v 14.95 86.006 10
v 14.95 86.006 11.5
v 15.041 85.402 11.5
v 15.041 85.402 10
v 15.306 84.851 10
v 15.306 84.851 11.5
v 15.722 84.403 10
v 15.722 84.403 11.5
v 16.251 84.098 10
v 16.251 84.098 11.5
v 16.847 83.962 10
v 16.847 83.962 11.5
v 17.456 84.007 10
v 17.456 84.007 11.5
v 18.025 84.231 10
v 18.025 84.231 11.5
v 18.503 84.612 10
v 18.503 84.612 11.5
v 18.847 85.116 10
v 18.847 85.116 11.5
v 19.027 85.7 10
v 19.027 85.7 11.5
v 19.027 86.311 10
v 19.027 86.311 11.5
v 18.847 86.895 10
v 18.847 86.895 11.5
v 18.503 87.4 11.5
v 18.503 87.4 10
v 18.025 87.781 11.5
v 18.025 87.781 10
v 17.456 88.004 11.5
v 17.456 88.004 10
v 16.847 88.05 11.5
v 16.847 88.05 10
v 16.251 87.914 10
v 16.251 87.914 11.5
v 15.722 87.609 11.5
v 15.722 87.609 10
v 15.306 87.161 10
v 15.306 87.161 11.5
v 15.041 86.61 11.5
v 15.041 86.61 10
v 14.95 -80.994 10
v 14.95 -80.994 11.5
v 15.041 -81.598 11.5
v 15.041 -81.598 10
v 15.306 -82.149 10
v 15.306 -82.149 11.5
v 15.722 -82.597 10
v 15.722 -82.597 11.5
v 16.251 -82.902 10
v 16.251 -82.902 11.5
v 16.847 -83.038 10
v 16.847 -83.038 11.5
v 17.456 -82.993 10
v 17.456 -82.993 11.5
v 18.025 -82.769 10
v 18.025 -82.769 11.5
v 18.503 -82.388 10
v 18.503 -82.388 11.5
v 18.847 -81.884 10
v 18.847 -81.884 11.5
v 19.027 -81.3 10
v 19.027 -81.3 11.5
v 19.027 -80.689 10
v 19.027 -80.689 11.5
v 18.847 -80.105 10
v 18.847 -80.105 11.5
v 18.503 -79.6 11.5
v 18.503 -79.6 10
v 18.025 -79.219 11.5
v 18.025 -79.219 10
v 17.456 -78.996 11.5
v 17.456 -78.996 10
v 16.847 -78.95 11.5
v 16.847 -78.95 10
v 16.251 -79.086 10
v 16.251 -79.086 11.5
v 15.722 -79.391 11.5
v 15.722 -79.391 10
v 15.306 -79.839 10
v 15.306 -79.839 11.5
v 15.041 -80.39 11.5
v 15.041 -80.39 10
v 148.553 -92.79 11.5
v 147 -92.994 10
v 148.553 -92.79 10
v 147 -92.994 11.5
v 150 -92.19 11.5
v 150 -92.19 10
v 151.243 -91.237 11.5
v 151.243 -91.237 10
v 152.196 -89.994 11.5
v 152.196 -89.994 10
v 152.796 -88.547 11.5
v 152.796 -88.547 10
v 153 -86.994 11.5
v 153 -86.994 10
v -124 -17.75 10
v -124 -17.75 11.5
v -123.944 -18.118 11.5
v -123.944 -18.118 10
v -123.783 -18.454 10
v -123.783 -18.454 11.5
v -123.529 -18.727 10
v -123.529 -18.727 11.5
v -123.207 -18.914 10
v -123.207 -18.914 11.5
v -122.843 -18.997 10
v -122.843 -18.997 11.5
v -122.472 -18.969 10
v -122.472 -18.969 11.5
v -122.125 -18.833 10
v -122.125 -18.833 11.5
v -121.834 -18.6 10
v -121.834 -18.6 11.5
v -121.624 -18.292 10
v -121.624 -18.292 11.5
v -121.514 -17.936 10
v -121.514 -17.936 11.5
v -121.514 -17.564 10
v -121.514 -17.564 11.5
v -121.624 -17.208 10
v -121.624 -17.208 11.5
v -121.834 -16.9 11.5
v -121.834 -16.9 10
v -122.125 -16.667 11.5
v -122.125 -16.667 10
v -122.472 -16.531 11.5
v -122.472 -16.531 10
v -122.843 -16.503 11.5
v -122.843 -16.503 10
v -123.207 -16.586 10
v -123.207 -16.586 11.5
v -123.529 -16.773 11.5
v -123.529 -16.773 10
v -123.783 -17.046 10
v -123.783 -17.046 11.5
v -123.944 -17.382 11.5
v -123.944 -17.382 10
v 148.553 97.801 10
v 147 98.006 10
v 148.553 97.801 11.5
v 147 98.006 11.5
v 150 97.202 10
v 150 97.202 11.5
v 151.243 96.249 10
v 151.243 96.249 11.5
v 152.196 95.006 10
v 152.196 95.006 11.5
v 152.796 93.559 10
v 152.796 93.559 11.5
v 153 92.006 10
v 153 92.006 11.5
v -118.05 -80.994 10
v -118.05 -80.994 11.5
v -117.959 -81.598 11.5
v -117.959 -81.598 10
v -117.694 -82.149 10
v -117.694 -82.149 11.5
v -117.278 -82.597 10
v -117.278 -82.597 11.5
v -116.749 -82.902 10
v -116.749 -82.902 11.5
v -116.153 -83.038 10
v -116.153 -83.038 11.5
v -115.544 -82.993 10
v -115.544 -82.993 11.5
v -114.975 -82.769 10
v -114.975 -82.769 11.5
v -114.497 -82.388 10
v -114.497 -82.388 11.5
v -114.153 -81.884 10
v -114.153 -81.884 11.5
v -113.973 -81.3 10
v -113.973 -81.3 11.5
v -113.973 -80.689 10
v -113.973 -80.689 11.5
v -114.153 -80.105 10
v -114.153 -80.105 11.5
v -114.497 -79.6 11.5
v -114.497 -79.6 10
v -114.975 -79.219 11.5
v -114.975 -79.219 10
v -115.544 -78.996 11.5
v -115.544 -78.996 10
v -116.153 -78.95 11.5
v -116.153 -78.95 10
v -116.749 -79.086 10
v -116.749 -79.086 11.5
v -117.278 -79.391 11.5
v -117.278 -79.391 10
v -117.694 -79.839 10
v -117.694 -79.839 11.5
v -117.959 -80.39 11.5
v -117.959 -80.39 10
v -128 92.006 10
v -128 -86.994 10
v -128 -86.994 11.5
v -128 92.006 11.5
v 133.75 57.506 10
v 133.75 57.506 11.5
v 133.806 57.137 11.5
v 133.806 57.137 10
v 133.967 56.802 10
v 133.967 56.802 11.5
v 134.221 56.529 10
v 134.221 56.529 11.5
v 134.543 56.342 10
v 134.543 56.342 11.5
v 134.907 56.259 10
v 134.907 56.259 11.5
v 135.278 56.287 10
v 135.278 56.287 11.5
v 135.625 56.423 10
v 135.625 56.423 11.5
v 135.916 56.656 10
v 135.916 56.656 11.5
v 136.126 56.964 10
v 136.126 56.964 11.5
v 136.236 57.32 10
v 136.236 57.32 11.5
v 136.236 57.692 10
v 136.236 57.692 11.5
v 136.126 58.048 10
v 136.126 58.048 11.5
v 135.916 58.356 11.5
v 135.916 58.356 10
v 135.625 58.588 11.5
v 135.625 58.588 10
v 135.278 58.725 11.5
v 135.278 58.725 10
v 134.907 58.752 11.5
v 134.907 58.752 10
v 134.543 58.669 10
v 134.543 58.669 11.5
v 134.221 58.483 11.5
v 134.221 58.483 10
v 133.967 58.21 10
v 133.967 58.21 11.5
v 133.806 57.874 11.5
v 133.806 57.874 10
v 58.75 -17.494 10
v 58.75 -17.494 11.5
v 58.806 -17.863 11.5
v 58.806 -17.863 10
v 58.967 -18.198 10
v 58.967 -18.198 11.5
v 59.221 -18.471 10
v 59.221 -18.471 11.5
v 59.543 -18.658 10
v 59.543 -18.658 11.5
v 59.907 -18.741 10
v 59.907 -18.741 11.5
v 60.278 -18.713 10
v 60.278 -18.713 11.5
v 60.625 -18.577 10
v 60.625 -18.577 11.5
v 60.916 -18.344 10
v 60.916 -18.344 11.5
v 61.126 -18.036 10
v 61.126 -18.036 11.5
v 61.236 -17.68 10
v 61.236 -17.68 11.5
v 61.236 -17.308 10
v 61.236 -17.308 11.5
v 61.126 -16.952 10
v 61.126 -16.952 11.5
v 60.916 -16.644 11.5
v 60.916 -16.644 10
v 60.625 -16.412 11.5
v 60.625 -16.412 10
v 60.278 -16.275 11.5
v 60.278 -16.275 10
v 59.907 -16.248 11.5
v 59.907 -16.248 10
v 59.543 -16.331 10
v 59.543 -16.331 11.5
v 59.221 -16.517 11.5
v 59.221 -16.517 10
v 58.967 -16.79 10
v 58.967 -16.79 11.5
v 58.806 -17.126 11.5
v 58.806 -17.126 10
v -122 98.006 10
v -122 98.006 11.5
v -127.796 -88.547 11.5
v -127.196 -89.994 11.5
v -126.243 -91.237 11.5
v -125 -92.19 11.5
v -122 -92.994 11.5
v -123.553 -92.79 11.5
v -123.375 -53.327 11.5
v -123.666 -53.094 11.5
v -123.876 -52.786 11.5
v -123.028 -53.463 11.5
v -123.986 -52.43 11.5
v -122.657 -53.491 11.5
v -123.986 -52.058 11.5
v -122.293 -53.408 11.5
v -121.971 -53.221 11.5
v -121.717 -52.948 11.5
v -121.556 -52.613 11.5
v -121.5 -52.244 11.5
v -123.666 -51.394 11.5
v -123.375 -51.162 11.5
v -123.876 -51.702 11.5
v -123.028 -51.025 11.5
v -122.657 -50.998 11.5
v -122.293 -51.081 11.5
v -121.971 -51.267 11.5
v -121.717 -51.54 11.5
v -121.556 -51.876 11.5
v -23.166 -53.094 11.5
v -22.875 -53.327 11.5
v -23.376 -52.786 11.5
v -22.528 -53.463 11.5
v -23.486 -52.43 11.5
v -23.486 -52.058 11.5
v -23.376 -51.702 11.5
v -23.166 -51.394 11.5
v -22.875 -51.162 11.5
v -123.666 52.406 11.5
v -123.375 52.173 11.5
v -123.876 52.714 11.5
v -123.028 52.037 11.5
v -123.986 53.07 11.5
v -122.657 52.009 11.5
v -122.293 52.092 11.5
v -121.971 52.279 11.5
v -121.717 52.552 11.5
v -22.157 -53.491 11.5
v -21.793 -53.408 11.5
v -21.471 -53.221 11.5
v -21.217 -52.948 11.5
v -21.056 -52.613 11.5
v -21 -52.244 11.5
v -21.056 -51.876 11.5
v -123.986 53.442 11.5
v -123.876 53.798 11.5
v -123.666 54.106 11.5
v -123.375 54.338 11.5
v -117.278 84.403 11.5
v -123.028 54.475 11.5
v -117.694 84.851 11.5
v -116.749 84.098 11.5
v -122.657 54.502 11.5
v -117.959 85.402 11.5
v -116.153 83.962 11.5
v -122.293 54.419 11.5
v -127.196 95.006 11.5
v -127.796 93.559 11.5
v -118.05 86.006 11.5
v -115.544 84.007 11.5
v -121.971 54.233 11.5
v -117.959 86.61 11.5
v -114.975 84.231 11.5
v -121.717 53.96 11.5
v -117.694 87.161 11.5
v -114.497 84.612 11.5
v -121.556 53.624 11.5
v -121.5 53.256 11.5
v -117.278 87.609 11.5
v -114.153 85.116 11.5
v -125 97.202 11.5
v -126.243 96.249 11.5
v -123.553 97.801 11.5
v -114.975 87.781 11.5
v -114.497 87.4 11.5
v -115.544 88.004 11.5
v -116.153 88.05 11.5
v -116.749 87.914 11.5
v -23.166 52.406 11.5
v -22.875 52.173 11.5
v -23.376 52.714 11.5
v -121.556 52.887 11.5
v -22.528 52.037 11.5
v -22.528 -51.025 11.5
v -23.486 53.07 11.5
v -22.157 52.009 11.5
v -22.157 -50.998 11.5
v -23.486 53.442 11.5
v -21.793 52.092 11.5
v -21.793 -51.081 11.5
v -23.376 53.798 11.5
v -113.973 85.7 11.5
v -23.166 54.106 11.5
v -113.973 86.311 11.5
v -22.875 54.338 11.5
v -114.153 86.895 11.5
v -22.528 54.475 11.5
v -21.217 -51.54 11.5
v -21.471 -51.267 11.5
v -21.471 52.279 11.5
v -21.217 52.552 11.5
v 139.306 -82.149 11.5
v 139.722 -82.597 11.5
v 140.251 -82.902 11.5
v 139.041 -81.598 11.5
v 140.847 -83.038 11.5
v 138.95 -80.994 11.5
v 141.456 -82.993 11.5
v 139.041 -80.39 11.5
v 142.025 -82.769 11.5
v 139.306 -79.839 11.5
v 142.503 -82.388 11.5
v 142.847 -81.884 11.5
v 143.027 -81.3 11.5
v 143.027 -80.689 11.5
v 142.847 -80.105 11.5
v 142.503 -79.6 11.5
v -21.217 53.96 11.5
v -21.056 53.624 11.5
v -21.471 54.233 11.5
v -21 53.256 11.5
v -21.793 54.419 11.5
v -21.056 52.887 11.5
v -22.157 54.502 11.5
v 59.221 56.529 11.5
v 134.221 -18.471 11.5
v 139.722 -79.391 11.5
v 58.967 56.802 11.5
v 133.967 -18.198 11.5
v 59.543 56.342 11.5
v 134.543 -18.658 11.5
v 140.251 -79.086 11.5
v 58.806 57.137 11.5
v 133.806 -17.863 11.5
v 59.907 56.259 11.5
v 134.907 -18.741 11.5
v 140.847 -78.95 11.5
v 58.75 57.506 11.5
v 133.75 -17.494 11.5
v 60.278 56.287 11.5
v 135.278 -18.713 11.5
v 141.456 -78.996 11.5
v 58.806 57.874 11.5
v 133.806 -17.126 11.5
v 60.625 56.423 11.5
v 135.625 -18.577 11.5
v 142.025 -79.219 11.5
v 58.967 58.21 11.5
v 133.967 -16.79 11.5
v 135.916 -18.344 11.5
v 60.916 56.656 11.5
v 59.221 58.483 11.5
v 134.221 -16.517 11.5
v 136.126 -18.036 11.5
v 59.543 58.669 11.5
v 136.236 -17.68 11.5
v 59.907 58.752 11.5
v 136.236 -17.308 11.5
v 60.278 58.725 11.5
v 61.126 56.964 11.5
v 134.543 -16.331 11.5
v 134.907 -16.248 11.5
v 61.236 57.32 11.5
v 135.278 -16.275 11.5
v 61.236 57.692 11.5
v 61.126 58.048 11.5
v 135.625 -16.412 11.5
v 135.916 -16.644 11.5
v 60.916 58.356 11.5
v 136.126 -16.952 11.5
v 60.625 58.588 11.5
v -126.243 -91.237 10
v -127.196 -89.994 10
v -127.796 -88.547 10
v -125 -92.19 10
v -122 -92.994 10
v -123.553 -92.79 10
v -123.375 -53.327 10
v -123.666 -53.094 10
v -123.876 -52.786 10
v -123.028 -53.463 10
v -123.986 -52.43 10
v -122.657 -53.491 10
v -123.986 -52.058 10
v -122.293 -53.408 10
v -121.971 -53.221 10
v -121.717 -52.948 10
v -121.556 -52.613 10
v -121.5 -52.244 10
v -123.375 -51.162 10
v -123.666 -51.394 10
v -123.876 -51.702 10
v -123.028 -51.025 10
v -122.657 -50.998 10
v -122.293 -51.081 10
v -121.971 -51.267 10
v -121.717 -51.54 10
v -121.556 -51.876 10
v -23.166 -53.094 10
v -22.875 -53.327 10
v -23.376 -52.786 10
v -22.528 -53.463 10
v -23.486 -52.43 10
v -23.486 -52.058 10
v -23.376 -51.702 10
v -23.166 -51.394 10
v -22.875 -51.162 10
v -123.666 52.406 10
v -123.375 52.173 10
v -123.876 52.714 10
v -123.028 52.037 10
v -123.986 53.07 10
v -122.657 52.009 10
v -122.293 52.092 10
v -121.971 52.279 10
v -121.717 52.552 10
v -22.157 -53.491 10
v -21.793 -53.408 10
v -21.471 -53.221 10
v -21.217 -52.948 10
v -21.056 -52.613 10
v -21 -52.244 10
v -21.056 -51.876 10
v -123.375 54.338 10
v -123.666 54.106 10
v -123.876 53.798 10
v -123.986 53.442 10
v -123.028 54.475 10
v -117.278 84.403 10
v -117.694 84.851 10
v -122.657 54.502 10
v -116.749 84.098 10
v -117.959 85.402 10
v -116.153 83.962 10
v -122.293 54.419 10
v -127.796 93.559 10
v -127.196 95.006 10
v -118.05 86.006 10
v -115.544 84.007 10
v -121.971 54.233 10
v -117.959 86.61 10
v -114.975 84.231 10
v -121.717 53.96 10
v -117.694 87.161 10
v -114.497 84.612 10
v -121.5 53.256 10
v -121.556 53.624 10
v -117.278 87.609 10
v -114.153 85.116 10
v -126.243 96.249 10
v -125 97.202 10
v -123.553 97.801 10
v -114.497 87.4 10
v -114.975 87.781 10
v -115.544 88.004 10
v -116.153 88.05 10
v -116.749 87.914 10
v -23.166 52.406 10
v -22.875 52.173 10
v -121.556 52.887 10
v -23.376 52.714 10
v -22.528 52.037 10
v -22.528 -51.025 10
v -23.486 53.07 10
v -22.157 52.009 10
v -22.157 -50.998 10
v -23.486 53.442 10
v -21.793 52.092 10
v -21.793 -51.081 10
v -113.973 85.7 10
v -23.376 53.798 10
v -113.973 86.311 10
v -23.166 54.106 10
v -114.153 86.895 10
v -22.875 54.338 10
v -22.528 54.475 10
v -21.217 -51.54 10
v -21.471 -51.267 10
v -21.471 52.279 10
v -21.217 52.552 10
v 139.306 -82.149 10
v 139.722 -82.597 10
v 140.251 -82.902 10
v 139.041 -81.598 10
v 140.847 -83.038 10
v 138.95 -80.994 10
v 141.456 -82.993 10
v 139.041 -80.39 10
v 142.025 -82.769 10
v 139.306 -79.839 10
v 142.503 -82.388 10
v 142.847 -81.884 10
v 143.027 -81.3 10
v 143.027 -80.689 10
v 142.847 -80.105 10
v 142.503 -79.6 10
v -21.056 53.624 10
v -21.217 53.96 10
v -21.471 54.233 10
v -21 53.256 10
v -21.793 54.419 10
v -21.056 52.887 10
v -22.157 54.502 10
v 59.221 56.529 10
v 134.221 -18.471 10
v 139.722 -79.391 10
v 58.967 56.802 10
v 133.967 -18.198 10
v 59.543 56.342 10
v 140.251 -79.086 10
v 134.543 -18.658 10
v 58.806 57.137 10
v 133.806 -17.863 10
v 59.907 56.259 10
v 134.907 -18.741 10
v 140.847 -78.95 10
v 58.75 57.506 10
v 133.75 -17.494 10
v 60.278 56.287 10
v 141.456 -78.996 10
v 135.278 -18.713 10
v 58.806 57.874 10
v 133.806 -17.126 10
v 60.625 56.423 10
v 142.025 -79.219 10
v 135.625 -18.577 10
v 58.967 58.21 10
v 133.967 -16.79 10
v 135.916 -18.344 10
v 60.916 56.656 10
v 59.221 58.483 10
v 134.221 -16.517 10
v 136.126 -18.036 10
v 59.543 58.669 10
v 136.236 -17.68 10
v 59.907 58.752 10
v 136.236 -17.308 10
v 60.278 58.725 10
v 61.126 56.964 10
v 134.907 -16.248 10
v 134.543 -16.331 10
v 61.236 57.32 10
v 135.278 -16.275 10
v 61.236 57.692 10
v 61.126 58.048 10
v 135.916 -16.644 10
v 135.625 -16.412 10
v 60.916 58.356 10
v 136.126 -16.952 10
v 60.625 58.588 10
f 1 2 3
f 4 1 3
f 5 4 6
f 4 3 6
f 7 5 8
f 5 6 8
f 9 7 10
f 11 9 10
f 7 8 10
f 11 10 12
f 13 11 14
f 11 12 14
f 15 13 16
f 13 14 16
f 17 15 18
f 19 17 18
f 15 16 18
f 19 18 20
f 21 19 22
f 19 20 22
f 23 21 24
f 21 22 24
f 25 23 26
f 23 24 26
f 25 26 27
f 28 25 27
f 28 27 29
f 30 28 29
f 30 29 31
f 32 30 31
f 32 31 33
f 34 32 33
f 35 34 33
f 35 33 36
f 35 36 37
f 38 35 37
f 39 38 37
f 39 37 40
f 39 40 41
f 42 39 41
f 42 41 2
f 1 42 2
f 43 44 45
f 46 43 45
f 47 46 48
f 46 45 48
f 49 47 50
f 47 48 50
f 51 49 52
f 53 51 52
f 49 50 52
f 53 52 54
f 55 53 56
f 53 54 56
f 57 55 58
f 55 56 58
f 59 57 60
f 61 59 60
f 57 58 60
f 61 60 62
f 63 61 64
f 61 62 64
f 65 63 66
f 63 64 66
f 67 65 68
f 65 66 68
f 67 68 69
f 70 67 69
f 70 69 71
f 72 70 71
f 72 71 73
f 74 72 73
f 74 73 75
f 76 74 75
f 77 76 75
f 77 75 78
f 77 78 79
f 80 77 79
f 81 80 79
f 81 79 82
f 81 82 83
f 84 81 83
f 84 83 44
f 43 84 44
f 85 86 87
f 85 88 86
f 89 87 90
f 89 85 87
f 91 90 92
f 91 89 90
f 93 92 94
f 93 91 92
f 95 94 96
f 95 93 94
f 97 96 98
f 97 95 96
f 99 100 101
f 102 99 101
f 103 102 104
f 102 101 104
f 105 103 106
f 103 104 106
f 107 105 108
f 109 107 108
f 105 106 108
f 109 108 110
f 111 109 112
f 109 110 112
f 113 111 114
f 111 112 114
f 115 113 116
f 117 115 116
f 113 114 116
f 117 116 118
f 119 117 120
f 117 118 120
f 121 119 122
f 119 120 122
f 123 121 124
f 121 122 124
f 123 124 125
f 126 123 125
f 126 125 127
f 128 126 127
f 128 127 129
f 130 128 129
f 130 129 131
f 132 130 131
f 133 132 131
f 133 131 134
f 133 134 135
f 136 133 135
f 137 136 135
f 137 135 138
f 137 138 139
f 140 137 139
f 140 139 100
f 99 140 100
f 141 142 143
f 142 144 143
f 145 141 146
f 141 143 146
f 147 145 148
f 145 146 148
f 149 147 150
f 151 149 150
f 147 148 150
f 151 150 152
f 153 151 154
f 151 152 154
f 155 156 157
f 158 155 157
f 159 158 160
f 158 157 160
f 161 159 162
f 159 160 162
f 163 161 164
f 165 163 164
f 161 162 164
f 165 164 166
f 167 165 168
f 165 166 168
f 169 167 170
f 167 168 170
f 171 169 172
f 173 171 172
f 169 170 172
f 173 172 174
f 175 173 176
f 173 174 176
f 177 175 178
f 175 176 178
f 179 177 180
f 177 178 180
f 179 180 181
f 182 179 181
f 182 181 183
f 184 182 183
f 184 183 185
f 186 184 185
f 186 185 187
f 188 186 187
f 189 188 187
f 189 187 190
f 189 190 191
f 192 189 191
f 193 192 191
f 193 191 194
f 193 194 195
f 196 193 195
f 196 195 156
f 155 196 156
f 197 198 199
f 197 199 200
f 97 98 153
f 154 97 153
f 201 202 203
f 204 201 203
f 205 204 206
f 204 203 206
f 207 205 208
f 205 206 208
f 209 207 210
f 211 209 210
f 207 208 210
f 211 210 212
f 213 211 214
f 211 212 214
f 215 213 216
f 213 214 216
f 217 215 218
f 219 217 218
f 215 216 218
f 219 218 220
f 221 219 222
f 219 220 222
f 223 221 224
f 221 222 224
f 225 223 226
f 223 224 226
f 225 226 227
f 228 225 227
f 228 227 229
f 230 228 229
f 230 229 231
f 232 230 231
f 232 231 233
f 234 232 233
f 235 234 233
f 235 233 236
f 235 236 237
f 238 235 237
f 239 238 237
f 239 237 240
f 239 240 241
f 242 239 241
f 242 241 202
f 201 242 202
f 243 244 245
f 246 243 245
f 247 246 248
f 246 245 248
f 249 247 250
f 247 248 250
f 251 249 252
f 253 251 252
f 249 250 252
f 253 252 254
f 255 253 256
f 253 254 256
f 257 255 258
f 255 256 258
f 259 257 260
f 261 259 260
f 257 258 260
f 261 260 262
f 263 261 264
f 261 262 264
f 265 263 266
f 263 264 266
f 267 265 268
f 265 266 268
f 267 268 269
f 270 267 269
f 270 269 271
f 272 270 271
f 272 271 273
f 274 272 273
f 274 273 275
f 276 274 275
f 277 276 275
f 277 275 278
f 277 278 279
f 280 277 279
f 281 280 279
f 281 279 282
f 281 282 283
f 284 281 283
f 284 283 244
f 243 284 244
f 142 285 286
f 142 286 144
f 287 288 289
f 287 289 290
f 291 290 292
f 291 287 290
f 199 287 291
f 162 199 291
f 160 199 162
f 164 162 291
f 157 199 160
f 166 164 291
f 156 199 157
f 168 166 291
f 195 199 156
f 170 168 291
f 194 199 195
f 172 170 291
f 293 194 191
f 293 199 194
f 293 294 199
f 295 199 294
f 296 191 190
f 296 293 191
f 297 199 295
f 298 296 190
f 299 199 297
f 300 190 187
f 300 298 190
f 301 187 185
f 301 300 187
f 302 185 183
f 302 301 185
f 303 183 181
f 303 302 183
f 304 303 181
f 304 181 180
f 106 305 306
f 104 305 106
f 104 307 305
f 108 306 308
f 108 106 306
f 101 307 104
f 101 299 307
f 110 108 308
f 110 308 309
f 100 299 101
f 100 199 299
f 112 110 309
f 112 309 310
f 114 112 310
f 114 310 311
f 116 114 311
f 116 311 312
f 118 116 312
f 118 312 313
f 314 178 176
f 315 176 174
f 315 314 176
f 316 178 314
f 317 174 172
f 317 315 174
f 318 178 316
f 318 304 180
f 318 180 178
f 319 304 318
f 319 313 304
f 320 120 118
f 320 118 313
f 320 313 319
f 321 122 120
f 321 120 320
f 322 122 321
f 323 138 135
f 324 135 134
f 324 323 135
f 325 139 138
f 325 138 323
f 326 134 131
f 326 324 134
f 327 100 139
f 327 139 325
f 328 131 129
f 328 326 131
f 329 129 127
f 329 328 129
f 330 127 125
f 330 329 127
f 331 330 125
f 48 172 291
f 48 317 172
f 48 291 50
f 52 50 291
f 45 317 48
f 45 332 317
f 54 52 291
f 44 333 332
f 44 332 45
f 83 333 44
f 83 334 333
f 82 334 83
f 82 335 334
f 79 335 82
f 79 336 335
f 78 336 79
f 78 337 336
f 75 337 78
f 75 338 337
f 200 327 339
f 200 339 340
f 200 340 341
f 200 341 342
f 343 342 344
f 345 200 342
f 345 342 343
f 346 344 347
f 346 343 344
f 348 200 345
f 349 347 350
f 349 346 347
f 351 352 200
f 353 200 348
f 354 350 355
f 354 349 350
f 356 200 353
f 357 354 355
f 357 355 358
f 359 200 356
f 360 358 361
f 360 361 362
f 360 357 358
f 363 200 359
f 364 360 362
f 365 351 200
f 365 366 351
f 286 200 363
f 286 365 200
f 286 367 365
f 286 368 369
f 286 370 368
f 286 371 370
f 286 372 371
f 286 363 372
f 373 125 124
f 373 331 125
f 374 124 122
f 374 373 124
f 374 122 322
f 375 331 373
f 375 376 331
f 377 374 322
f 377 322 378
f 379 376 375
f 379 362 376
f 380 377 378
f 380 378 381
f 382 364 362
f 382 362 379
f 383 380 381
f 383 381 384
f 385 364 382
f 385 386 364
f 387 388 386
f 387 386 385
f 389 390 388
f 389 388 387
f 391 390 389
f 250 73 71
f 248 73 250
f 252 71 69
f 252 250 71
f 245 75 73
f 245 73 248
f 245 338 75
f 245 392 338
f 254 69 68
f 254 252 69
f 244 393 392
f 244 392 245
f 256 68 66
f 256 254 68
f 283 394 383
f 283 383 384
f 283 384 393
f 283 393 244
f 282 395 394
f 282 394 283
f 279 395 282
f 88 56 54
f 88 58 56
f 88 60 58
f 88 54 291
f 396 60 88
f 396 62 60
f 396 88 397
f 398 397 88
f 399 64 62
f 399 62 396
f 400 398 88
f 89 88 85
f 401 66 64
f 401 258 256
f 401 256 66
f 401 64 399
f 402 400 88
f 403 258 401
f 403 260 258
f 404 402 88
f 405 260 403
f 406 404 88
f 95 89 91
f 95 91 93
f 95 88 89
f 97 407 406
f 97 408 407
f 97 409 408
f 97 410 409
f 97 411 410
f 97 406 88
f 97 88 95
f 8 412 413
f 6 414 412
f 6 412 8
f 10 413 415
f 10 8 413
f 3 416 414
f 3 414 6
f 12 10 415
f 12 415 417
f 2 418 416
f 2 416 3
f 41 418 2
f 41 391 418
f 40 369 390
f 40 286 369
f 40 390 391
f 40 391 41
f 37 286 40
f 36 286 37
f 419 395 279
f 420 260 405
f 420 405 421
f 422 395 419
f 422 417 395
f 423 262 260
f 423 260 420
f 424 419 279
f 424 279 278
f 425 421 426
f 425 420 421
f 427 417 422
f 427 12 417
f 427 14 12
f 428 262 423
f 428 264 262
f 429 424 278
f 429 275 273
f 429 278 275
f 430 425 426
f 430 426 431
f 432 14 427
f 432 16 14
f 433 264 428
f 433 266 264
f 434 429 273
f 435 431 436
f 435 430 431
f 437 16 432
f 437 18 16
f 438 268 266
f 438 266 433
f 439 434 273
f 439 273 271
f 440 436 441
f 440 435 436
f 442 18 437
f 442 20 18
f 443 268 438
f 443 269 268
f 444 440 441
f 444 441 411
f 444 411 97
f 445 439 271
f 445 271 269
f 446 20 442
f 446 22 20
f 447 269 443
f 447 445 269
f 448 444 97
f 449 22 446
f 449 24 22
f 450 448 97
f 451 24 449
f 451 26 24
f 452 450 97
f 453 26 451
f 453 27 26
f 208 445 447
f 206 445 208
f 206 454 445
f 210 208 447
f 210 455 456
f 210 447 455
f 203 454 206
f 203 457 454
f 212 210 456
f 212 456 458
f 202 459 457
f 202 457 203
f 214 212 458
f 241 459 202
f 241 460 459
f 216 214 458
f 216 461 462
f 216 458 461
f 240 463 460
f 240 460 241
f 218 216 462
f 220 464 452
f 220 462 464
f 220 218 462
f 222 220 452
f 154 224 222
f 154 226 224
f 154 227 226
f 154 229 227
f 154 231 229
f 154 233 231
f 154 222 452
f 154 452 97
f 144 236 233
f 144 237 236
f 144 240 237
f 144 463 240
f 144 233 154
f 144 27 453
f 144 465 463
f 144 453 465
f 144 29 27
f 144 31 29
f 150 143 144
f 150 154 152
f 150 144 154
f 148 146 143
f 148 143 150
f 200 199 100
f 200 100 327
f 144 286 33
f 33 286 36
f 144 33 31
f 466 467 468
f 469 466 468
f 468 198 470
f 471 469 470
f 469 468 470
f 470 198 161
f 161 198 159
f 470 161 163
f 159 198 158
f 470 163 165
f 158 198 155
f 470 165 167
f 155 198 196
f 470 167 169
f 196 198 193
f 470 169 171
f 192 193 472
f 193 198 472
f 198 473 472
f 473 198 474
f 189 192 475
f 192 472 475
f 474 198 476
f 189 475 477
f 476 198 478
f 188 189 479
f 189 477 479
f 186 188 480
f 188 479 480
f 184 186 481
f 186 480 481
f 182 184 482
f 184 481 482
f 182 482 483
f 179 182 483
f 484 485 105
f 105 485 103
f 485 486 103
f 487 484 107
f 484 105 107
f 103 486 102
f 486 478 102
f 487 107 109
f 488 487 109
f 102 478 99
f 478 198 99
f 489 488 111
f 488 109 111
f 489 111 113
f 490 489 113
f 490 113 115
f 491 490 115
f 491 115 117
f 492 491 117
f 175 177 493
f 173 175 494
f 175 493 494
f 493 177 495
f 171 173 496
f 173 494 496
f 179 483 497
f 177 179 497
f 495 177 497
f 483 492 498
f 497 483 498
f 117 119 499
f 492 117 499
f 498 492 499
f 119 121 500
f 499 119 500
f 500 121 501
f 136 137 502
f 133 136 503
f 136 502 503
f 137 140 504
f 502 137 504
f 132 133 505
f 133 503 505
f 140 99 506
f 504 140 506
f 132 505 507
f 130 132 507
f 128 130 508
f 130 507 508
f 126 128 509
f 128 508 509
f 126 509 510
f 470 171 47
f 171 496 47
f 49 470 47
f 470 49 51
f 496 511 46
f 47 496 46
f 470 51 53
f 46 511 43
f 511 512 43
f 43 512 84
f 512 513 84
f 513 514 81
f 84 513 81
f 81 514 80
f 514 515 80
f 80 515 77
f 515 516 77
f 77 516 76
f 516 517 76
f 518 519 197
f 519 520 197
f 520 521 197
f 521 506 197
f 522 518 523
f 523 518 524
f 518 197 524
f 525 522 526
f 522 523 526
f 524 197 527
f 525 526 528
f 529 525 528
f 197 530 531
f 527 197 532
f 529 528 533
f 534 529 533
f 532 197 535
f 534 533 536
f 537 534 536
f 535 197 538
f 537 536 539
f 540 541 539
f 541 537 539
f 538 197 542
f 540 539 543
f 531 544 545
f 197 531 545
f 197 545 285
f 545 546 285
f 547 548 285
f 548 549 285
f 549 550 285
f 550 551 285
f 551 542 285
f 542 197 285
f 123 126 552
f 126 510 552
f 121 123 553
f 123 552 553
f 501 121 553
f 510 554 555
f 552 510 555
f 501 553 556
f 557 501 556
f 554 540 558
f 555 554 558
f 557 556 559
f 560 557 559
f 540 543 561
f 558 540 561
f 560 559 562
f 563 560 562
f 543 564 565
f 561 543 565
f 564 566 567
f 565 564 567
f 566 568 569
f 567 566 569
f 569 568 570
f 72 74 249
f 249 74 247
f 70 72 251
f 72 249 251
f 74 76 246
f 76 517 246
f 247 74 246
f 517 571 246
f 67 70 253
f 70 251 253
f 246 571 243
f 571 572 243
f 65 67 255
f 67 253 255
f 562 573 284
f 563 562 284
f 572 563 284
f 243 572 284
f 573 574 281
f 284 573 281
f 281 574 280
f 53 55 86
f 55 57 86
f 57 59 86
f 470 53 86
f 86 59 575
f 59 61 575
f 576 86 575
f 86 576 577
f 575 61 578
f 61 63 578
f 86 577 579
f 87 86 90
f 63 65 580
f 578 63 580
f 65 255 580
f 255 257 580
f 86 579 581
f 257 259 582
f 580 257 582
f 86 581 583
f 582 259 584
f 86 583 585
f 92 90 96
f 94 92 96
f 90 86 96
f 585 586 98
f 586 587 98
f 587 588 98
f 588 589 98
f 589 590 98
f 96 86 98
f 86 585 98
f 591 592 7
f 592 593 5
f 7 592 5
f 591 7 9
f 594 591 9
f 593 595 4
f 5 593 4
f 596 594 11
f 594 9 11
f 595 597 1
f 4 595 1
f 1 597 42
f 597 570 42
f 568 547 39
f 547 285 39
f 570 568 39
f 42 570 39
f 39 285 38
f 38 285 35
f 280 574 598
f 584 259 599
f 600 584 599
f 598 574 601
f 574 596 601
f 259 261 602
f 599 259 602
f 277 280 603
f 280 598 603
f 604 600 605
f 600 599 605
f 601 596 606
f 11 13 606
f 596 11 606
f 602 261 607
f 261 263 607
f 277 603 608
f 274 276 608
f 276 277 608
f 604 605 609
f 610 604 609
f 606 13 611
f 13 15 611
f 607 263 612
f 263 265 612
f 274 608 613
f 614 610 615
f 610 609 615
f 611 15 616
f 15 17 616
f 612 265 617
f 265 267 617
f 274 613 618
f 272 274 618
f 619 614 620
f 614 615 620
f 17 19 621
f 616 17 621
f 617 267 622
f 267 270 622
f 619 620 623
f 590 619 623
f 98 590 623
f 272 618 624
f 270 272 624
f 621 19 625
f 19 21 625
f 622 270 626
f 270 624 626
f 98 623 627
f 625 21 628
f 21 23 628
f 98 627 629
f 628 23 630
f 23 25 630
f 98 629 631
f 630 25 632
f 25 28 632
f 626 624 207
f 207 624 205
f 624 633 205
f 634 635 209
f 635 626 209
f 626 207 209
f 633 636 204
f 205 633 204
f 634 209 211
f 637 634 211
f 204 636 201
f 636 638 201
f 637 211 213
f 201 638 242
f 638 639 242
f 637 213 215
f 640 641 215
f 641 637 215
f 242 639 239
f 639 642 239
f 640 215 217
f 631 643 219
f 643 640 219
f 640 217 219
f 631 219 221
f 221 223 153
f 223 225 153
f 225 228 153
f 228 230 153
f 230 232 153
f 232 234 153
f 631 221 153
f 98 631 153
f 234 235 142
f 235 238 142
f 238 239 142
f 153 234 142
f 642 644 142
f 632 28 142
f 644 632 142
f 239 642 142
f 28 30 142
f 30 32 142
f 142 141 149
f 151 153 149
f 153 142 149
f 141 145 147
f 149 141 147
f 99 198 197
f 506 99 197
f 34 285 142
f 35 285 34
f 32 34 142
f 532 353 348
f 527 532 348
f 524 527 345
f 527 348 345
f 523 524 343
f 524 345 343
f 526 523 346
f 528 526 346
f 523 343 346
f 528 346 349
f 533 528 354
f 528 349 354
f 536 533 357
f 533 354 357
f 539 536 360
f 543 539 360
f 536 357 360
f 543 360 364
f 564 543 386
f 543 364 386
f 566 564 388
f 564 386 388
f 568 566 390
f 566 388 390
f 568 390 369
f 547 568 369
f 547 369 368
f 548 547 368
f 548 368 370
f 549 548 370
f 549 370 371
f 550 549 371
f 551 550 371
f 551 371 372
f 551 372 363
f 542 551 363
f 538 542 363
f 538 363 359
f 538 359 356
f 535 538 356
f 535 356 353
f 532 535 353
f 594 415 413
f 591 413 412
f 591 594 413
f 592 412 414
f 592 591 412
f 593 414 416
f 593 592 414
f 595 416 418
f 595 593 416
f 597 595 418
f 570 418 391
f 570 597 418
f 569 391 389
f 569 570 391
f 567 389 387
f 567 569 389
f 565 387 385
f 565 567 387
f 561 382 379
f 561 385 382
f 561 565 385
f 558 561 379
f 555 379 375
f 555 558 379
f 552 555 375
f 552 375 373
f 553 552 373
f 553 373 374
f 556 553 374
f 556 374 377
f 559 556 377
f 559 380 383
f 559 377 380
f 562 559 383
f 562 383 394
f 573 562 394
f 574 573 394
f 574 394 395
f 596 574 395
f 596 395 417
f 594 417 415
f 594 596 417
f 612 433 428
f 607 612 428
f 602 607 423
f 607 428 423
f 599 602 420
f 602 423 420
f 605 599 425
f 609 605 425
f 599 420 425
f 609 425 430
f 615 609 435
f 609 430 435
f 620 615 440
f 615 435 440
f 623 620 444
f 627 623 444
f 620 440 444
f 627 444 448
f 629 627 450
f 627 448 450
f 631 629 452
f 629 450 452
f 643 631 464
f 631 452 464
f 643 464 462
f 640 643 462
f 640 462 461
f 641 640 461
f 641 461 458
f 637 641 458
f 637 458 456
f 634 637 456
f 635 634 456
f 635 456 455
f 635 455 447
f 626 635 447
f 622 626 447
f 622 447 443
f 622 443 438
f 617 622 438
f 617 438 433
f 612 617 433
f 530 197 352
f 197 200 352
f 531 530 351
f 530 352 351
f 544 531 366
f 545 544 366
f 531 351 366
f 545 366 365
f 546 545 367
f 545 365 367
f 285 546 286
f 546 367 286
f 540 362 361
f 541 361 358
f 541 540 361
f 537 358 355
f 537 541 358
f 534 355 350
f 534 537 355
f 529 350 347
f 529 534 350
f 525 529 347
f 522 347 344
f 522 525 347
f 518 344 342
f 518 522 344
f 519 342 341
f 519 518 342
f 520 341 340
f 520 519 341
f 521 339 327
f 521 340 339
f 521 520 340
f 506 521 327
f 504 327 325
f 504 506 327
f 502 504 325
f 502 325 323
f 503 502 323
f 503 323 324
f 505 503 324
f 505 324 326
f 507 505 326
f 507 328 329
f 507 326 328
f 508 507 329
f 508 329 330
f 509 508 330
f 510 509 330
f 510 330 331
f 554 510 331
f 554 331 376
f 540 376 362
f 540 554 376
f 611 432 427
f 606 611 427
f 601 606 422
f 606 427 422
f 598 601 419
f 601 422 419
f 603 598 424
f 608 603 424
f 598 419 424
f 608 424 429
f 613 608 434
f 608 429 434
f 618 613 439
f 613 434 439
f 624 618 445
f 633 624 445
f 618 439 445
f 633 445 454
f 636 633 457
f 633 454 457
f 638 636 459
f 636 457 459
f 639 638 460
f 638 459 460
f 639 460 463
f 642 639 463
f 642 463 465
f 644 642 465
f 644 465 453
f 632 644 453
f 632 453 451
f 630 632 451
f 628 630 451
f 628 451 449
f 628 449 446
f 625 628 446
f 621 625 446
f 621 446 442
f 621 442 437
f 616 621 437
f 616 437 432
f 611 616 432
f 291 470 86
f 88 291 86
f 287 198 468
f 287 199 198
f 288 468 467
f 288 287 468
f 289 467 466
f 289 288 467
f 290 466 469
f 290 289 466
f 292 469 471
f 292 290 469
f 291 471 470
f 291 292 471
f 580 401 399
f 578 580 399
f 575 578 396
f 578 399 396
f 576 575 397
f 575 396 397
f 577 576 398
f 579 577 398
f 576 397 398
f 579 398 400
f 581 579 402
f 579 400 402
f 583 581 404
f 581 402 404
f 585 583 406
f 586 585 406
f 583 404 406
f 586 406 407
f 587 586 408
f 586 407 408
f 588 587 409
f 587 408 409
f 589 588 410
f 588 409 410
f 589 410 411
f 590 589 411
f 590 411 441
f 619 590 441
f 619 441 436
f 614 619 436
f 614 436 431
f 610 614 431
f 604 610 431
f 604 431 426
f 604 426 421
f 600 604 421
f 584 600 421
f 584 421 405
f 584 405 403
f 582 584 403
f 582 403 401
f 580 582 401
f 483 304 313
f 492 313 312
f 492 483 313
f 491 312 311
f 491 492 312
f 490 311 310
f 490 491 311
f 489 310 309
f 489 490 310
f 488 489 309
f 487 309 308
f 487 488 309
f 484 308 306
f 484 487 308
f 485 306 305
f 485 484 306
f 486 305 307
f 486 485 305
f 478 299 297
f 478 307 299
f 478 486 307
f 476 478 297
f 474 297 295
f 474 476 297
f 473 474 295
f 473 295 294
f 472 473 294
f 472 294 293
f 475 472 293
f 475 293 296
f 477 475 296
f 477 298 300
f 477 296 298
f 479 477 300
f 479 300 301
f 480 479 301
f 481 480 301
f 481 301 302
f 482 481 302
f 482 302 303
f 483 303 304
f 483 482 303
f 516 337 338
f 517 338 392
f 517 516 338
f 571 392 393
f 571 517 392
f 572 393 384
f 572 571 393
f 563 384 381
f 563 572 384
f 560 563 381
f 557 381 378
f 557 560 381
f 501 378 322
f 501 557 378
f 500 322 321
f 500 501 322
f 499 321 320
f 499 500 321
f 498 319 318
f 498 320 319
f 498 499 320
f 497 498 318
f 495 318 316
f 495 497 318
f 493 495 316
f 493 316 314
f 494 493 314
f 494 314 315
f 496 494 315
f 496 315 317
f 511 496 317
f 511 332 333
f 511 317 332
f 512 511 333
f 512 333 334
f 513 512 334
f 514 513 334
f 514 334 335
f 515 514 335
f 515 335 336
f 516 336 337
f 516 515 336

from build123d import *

# Parameters (mm, degrees)
F0_W     = 281
F0_H     = 191
F0_W_2   = 105
F0_H_2   = 110
F0_H_3   = 150
F0_R     = 1.25
F1_DEPTH = 1.5
F2_DEPTH = 25
F3_D     = 2.5
F4_D     = 4.1
F5_R     = 6


with BuildPart() as f1:
    # F0 (on Top) → F1 (new body)
    with BuildSketch(Plane.XY):
        with Locations((10.5, 2.505872022)):
            Rectangle(F0_W, F0_H)
        with Locations((-74.5, 0.505872022)):
            Rectangle(F0_W_2, F0_H_2, mode=Mode.SUBTRACT)
        with Locations((95.5, 20.005872022)):
            Rectangle(F0_W_2, F0_H_3, mode=Mode.SUBTRACT)
        with Locations((-74.5, 0.505872022)):
            Rectangle(F0_W_2, F0_H_2)
        with Locations((-124.75, -52.244127978)):
            Circle(F0_R, mode=Mode.SUBTRACT)
        with Locations((-24.25, -52.244127978)):
            Circle(F0_R, mode=Mode.SUBTRACT)
        with Locations((-124.75, -17.75)):
            Circle(F0_R, mode=Mode.SUBTRACT)
        with Locations((-124.75, 53.255872022)):
            Circle(F0_R, mode=Mode.SUBTRACT)
        with Locations((-24.25, 53.255872022)):
            Circle(F0_R, mode=Mode.SUBTRACT)
        with Locations((95.5, 20.005872022)):
            Rectangle(F0_W_2, F0_H_3)
        with Locations((-24.25, 53.255872022)):
            Circle(F0_R)
        with Locations((-124.75, 53.255872022)):
            Circle(F0_R)
        with Locations((-124.75, -52.244127978)):
            Circle(F0_R)
        with Locations((-24.25, -52.244127978)):
            Circle(F0_R)
        with Locations((-124.75, -17.75)):
            Circle(F0_R)
    extrude(amount=F1_DEPTH)

    # F0 (on Top) → F2 (cut)
    with BuildSketch(Plane.XY):
        with Locations((-124.75, 53.255872022)):
            Circle(F0_R)
        with Locations((-24.25, 53.255872022)):
            Circle(F0_R)
        with Locations((-24.25, -52.244127978)):
            Circle(F0_R)
        with Locations((-124.75, -52.244127978)):
            Circle(F0_R)
    extrude(amount=F2_DEPTH, mode=Mode.SUBTRACT)

    # F3 (through all)
    with Locations(Plane(origin=(0, 0, 0), x_dir=(1, 0, 0), z_dir=(0, 0, -1))):
        with Locations((133, -57.505872022), (58, -57.505872022), (58, 17.494127978), (133, 17.494127978), (-124.75, 17.75)):
            Hole(F3_D / 2)

    # F4 (through all)
    with Locations(Plane(origin=(0, 0, 0), x_dir=(1, 0, 0), z_dir=(0, 0, -1))):
        with Locations((-118, -86.005872022), (15, -86.005872022), (139, 80.994127978), (-118, 80.994127978), (15, 80.994127978)):
            Hole(F4_D / 2)

    # F5
    f5_edges = [f1.edges().sort_by_distance(p)[0] for p in [
        (-130, 98.005872, 0.75),
        (-130, -92.994128, 0.75),
        (151, -92.994128, 0.75),
        (151, 98.005872, 0.75),
    ]]
    fillet(f5_edges, radius=F5_R)


with BuildPart() as f1_1:
    # F6: moved
    add(f1.part.moved(Location((0, 0, 10))))


with BuildPart() as f1_2:
    # F7: moved
    add(f1_1.part.moved(Location((2, 0, 0))))


solid = f1_2.part
